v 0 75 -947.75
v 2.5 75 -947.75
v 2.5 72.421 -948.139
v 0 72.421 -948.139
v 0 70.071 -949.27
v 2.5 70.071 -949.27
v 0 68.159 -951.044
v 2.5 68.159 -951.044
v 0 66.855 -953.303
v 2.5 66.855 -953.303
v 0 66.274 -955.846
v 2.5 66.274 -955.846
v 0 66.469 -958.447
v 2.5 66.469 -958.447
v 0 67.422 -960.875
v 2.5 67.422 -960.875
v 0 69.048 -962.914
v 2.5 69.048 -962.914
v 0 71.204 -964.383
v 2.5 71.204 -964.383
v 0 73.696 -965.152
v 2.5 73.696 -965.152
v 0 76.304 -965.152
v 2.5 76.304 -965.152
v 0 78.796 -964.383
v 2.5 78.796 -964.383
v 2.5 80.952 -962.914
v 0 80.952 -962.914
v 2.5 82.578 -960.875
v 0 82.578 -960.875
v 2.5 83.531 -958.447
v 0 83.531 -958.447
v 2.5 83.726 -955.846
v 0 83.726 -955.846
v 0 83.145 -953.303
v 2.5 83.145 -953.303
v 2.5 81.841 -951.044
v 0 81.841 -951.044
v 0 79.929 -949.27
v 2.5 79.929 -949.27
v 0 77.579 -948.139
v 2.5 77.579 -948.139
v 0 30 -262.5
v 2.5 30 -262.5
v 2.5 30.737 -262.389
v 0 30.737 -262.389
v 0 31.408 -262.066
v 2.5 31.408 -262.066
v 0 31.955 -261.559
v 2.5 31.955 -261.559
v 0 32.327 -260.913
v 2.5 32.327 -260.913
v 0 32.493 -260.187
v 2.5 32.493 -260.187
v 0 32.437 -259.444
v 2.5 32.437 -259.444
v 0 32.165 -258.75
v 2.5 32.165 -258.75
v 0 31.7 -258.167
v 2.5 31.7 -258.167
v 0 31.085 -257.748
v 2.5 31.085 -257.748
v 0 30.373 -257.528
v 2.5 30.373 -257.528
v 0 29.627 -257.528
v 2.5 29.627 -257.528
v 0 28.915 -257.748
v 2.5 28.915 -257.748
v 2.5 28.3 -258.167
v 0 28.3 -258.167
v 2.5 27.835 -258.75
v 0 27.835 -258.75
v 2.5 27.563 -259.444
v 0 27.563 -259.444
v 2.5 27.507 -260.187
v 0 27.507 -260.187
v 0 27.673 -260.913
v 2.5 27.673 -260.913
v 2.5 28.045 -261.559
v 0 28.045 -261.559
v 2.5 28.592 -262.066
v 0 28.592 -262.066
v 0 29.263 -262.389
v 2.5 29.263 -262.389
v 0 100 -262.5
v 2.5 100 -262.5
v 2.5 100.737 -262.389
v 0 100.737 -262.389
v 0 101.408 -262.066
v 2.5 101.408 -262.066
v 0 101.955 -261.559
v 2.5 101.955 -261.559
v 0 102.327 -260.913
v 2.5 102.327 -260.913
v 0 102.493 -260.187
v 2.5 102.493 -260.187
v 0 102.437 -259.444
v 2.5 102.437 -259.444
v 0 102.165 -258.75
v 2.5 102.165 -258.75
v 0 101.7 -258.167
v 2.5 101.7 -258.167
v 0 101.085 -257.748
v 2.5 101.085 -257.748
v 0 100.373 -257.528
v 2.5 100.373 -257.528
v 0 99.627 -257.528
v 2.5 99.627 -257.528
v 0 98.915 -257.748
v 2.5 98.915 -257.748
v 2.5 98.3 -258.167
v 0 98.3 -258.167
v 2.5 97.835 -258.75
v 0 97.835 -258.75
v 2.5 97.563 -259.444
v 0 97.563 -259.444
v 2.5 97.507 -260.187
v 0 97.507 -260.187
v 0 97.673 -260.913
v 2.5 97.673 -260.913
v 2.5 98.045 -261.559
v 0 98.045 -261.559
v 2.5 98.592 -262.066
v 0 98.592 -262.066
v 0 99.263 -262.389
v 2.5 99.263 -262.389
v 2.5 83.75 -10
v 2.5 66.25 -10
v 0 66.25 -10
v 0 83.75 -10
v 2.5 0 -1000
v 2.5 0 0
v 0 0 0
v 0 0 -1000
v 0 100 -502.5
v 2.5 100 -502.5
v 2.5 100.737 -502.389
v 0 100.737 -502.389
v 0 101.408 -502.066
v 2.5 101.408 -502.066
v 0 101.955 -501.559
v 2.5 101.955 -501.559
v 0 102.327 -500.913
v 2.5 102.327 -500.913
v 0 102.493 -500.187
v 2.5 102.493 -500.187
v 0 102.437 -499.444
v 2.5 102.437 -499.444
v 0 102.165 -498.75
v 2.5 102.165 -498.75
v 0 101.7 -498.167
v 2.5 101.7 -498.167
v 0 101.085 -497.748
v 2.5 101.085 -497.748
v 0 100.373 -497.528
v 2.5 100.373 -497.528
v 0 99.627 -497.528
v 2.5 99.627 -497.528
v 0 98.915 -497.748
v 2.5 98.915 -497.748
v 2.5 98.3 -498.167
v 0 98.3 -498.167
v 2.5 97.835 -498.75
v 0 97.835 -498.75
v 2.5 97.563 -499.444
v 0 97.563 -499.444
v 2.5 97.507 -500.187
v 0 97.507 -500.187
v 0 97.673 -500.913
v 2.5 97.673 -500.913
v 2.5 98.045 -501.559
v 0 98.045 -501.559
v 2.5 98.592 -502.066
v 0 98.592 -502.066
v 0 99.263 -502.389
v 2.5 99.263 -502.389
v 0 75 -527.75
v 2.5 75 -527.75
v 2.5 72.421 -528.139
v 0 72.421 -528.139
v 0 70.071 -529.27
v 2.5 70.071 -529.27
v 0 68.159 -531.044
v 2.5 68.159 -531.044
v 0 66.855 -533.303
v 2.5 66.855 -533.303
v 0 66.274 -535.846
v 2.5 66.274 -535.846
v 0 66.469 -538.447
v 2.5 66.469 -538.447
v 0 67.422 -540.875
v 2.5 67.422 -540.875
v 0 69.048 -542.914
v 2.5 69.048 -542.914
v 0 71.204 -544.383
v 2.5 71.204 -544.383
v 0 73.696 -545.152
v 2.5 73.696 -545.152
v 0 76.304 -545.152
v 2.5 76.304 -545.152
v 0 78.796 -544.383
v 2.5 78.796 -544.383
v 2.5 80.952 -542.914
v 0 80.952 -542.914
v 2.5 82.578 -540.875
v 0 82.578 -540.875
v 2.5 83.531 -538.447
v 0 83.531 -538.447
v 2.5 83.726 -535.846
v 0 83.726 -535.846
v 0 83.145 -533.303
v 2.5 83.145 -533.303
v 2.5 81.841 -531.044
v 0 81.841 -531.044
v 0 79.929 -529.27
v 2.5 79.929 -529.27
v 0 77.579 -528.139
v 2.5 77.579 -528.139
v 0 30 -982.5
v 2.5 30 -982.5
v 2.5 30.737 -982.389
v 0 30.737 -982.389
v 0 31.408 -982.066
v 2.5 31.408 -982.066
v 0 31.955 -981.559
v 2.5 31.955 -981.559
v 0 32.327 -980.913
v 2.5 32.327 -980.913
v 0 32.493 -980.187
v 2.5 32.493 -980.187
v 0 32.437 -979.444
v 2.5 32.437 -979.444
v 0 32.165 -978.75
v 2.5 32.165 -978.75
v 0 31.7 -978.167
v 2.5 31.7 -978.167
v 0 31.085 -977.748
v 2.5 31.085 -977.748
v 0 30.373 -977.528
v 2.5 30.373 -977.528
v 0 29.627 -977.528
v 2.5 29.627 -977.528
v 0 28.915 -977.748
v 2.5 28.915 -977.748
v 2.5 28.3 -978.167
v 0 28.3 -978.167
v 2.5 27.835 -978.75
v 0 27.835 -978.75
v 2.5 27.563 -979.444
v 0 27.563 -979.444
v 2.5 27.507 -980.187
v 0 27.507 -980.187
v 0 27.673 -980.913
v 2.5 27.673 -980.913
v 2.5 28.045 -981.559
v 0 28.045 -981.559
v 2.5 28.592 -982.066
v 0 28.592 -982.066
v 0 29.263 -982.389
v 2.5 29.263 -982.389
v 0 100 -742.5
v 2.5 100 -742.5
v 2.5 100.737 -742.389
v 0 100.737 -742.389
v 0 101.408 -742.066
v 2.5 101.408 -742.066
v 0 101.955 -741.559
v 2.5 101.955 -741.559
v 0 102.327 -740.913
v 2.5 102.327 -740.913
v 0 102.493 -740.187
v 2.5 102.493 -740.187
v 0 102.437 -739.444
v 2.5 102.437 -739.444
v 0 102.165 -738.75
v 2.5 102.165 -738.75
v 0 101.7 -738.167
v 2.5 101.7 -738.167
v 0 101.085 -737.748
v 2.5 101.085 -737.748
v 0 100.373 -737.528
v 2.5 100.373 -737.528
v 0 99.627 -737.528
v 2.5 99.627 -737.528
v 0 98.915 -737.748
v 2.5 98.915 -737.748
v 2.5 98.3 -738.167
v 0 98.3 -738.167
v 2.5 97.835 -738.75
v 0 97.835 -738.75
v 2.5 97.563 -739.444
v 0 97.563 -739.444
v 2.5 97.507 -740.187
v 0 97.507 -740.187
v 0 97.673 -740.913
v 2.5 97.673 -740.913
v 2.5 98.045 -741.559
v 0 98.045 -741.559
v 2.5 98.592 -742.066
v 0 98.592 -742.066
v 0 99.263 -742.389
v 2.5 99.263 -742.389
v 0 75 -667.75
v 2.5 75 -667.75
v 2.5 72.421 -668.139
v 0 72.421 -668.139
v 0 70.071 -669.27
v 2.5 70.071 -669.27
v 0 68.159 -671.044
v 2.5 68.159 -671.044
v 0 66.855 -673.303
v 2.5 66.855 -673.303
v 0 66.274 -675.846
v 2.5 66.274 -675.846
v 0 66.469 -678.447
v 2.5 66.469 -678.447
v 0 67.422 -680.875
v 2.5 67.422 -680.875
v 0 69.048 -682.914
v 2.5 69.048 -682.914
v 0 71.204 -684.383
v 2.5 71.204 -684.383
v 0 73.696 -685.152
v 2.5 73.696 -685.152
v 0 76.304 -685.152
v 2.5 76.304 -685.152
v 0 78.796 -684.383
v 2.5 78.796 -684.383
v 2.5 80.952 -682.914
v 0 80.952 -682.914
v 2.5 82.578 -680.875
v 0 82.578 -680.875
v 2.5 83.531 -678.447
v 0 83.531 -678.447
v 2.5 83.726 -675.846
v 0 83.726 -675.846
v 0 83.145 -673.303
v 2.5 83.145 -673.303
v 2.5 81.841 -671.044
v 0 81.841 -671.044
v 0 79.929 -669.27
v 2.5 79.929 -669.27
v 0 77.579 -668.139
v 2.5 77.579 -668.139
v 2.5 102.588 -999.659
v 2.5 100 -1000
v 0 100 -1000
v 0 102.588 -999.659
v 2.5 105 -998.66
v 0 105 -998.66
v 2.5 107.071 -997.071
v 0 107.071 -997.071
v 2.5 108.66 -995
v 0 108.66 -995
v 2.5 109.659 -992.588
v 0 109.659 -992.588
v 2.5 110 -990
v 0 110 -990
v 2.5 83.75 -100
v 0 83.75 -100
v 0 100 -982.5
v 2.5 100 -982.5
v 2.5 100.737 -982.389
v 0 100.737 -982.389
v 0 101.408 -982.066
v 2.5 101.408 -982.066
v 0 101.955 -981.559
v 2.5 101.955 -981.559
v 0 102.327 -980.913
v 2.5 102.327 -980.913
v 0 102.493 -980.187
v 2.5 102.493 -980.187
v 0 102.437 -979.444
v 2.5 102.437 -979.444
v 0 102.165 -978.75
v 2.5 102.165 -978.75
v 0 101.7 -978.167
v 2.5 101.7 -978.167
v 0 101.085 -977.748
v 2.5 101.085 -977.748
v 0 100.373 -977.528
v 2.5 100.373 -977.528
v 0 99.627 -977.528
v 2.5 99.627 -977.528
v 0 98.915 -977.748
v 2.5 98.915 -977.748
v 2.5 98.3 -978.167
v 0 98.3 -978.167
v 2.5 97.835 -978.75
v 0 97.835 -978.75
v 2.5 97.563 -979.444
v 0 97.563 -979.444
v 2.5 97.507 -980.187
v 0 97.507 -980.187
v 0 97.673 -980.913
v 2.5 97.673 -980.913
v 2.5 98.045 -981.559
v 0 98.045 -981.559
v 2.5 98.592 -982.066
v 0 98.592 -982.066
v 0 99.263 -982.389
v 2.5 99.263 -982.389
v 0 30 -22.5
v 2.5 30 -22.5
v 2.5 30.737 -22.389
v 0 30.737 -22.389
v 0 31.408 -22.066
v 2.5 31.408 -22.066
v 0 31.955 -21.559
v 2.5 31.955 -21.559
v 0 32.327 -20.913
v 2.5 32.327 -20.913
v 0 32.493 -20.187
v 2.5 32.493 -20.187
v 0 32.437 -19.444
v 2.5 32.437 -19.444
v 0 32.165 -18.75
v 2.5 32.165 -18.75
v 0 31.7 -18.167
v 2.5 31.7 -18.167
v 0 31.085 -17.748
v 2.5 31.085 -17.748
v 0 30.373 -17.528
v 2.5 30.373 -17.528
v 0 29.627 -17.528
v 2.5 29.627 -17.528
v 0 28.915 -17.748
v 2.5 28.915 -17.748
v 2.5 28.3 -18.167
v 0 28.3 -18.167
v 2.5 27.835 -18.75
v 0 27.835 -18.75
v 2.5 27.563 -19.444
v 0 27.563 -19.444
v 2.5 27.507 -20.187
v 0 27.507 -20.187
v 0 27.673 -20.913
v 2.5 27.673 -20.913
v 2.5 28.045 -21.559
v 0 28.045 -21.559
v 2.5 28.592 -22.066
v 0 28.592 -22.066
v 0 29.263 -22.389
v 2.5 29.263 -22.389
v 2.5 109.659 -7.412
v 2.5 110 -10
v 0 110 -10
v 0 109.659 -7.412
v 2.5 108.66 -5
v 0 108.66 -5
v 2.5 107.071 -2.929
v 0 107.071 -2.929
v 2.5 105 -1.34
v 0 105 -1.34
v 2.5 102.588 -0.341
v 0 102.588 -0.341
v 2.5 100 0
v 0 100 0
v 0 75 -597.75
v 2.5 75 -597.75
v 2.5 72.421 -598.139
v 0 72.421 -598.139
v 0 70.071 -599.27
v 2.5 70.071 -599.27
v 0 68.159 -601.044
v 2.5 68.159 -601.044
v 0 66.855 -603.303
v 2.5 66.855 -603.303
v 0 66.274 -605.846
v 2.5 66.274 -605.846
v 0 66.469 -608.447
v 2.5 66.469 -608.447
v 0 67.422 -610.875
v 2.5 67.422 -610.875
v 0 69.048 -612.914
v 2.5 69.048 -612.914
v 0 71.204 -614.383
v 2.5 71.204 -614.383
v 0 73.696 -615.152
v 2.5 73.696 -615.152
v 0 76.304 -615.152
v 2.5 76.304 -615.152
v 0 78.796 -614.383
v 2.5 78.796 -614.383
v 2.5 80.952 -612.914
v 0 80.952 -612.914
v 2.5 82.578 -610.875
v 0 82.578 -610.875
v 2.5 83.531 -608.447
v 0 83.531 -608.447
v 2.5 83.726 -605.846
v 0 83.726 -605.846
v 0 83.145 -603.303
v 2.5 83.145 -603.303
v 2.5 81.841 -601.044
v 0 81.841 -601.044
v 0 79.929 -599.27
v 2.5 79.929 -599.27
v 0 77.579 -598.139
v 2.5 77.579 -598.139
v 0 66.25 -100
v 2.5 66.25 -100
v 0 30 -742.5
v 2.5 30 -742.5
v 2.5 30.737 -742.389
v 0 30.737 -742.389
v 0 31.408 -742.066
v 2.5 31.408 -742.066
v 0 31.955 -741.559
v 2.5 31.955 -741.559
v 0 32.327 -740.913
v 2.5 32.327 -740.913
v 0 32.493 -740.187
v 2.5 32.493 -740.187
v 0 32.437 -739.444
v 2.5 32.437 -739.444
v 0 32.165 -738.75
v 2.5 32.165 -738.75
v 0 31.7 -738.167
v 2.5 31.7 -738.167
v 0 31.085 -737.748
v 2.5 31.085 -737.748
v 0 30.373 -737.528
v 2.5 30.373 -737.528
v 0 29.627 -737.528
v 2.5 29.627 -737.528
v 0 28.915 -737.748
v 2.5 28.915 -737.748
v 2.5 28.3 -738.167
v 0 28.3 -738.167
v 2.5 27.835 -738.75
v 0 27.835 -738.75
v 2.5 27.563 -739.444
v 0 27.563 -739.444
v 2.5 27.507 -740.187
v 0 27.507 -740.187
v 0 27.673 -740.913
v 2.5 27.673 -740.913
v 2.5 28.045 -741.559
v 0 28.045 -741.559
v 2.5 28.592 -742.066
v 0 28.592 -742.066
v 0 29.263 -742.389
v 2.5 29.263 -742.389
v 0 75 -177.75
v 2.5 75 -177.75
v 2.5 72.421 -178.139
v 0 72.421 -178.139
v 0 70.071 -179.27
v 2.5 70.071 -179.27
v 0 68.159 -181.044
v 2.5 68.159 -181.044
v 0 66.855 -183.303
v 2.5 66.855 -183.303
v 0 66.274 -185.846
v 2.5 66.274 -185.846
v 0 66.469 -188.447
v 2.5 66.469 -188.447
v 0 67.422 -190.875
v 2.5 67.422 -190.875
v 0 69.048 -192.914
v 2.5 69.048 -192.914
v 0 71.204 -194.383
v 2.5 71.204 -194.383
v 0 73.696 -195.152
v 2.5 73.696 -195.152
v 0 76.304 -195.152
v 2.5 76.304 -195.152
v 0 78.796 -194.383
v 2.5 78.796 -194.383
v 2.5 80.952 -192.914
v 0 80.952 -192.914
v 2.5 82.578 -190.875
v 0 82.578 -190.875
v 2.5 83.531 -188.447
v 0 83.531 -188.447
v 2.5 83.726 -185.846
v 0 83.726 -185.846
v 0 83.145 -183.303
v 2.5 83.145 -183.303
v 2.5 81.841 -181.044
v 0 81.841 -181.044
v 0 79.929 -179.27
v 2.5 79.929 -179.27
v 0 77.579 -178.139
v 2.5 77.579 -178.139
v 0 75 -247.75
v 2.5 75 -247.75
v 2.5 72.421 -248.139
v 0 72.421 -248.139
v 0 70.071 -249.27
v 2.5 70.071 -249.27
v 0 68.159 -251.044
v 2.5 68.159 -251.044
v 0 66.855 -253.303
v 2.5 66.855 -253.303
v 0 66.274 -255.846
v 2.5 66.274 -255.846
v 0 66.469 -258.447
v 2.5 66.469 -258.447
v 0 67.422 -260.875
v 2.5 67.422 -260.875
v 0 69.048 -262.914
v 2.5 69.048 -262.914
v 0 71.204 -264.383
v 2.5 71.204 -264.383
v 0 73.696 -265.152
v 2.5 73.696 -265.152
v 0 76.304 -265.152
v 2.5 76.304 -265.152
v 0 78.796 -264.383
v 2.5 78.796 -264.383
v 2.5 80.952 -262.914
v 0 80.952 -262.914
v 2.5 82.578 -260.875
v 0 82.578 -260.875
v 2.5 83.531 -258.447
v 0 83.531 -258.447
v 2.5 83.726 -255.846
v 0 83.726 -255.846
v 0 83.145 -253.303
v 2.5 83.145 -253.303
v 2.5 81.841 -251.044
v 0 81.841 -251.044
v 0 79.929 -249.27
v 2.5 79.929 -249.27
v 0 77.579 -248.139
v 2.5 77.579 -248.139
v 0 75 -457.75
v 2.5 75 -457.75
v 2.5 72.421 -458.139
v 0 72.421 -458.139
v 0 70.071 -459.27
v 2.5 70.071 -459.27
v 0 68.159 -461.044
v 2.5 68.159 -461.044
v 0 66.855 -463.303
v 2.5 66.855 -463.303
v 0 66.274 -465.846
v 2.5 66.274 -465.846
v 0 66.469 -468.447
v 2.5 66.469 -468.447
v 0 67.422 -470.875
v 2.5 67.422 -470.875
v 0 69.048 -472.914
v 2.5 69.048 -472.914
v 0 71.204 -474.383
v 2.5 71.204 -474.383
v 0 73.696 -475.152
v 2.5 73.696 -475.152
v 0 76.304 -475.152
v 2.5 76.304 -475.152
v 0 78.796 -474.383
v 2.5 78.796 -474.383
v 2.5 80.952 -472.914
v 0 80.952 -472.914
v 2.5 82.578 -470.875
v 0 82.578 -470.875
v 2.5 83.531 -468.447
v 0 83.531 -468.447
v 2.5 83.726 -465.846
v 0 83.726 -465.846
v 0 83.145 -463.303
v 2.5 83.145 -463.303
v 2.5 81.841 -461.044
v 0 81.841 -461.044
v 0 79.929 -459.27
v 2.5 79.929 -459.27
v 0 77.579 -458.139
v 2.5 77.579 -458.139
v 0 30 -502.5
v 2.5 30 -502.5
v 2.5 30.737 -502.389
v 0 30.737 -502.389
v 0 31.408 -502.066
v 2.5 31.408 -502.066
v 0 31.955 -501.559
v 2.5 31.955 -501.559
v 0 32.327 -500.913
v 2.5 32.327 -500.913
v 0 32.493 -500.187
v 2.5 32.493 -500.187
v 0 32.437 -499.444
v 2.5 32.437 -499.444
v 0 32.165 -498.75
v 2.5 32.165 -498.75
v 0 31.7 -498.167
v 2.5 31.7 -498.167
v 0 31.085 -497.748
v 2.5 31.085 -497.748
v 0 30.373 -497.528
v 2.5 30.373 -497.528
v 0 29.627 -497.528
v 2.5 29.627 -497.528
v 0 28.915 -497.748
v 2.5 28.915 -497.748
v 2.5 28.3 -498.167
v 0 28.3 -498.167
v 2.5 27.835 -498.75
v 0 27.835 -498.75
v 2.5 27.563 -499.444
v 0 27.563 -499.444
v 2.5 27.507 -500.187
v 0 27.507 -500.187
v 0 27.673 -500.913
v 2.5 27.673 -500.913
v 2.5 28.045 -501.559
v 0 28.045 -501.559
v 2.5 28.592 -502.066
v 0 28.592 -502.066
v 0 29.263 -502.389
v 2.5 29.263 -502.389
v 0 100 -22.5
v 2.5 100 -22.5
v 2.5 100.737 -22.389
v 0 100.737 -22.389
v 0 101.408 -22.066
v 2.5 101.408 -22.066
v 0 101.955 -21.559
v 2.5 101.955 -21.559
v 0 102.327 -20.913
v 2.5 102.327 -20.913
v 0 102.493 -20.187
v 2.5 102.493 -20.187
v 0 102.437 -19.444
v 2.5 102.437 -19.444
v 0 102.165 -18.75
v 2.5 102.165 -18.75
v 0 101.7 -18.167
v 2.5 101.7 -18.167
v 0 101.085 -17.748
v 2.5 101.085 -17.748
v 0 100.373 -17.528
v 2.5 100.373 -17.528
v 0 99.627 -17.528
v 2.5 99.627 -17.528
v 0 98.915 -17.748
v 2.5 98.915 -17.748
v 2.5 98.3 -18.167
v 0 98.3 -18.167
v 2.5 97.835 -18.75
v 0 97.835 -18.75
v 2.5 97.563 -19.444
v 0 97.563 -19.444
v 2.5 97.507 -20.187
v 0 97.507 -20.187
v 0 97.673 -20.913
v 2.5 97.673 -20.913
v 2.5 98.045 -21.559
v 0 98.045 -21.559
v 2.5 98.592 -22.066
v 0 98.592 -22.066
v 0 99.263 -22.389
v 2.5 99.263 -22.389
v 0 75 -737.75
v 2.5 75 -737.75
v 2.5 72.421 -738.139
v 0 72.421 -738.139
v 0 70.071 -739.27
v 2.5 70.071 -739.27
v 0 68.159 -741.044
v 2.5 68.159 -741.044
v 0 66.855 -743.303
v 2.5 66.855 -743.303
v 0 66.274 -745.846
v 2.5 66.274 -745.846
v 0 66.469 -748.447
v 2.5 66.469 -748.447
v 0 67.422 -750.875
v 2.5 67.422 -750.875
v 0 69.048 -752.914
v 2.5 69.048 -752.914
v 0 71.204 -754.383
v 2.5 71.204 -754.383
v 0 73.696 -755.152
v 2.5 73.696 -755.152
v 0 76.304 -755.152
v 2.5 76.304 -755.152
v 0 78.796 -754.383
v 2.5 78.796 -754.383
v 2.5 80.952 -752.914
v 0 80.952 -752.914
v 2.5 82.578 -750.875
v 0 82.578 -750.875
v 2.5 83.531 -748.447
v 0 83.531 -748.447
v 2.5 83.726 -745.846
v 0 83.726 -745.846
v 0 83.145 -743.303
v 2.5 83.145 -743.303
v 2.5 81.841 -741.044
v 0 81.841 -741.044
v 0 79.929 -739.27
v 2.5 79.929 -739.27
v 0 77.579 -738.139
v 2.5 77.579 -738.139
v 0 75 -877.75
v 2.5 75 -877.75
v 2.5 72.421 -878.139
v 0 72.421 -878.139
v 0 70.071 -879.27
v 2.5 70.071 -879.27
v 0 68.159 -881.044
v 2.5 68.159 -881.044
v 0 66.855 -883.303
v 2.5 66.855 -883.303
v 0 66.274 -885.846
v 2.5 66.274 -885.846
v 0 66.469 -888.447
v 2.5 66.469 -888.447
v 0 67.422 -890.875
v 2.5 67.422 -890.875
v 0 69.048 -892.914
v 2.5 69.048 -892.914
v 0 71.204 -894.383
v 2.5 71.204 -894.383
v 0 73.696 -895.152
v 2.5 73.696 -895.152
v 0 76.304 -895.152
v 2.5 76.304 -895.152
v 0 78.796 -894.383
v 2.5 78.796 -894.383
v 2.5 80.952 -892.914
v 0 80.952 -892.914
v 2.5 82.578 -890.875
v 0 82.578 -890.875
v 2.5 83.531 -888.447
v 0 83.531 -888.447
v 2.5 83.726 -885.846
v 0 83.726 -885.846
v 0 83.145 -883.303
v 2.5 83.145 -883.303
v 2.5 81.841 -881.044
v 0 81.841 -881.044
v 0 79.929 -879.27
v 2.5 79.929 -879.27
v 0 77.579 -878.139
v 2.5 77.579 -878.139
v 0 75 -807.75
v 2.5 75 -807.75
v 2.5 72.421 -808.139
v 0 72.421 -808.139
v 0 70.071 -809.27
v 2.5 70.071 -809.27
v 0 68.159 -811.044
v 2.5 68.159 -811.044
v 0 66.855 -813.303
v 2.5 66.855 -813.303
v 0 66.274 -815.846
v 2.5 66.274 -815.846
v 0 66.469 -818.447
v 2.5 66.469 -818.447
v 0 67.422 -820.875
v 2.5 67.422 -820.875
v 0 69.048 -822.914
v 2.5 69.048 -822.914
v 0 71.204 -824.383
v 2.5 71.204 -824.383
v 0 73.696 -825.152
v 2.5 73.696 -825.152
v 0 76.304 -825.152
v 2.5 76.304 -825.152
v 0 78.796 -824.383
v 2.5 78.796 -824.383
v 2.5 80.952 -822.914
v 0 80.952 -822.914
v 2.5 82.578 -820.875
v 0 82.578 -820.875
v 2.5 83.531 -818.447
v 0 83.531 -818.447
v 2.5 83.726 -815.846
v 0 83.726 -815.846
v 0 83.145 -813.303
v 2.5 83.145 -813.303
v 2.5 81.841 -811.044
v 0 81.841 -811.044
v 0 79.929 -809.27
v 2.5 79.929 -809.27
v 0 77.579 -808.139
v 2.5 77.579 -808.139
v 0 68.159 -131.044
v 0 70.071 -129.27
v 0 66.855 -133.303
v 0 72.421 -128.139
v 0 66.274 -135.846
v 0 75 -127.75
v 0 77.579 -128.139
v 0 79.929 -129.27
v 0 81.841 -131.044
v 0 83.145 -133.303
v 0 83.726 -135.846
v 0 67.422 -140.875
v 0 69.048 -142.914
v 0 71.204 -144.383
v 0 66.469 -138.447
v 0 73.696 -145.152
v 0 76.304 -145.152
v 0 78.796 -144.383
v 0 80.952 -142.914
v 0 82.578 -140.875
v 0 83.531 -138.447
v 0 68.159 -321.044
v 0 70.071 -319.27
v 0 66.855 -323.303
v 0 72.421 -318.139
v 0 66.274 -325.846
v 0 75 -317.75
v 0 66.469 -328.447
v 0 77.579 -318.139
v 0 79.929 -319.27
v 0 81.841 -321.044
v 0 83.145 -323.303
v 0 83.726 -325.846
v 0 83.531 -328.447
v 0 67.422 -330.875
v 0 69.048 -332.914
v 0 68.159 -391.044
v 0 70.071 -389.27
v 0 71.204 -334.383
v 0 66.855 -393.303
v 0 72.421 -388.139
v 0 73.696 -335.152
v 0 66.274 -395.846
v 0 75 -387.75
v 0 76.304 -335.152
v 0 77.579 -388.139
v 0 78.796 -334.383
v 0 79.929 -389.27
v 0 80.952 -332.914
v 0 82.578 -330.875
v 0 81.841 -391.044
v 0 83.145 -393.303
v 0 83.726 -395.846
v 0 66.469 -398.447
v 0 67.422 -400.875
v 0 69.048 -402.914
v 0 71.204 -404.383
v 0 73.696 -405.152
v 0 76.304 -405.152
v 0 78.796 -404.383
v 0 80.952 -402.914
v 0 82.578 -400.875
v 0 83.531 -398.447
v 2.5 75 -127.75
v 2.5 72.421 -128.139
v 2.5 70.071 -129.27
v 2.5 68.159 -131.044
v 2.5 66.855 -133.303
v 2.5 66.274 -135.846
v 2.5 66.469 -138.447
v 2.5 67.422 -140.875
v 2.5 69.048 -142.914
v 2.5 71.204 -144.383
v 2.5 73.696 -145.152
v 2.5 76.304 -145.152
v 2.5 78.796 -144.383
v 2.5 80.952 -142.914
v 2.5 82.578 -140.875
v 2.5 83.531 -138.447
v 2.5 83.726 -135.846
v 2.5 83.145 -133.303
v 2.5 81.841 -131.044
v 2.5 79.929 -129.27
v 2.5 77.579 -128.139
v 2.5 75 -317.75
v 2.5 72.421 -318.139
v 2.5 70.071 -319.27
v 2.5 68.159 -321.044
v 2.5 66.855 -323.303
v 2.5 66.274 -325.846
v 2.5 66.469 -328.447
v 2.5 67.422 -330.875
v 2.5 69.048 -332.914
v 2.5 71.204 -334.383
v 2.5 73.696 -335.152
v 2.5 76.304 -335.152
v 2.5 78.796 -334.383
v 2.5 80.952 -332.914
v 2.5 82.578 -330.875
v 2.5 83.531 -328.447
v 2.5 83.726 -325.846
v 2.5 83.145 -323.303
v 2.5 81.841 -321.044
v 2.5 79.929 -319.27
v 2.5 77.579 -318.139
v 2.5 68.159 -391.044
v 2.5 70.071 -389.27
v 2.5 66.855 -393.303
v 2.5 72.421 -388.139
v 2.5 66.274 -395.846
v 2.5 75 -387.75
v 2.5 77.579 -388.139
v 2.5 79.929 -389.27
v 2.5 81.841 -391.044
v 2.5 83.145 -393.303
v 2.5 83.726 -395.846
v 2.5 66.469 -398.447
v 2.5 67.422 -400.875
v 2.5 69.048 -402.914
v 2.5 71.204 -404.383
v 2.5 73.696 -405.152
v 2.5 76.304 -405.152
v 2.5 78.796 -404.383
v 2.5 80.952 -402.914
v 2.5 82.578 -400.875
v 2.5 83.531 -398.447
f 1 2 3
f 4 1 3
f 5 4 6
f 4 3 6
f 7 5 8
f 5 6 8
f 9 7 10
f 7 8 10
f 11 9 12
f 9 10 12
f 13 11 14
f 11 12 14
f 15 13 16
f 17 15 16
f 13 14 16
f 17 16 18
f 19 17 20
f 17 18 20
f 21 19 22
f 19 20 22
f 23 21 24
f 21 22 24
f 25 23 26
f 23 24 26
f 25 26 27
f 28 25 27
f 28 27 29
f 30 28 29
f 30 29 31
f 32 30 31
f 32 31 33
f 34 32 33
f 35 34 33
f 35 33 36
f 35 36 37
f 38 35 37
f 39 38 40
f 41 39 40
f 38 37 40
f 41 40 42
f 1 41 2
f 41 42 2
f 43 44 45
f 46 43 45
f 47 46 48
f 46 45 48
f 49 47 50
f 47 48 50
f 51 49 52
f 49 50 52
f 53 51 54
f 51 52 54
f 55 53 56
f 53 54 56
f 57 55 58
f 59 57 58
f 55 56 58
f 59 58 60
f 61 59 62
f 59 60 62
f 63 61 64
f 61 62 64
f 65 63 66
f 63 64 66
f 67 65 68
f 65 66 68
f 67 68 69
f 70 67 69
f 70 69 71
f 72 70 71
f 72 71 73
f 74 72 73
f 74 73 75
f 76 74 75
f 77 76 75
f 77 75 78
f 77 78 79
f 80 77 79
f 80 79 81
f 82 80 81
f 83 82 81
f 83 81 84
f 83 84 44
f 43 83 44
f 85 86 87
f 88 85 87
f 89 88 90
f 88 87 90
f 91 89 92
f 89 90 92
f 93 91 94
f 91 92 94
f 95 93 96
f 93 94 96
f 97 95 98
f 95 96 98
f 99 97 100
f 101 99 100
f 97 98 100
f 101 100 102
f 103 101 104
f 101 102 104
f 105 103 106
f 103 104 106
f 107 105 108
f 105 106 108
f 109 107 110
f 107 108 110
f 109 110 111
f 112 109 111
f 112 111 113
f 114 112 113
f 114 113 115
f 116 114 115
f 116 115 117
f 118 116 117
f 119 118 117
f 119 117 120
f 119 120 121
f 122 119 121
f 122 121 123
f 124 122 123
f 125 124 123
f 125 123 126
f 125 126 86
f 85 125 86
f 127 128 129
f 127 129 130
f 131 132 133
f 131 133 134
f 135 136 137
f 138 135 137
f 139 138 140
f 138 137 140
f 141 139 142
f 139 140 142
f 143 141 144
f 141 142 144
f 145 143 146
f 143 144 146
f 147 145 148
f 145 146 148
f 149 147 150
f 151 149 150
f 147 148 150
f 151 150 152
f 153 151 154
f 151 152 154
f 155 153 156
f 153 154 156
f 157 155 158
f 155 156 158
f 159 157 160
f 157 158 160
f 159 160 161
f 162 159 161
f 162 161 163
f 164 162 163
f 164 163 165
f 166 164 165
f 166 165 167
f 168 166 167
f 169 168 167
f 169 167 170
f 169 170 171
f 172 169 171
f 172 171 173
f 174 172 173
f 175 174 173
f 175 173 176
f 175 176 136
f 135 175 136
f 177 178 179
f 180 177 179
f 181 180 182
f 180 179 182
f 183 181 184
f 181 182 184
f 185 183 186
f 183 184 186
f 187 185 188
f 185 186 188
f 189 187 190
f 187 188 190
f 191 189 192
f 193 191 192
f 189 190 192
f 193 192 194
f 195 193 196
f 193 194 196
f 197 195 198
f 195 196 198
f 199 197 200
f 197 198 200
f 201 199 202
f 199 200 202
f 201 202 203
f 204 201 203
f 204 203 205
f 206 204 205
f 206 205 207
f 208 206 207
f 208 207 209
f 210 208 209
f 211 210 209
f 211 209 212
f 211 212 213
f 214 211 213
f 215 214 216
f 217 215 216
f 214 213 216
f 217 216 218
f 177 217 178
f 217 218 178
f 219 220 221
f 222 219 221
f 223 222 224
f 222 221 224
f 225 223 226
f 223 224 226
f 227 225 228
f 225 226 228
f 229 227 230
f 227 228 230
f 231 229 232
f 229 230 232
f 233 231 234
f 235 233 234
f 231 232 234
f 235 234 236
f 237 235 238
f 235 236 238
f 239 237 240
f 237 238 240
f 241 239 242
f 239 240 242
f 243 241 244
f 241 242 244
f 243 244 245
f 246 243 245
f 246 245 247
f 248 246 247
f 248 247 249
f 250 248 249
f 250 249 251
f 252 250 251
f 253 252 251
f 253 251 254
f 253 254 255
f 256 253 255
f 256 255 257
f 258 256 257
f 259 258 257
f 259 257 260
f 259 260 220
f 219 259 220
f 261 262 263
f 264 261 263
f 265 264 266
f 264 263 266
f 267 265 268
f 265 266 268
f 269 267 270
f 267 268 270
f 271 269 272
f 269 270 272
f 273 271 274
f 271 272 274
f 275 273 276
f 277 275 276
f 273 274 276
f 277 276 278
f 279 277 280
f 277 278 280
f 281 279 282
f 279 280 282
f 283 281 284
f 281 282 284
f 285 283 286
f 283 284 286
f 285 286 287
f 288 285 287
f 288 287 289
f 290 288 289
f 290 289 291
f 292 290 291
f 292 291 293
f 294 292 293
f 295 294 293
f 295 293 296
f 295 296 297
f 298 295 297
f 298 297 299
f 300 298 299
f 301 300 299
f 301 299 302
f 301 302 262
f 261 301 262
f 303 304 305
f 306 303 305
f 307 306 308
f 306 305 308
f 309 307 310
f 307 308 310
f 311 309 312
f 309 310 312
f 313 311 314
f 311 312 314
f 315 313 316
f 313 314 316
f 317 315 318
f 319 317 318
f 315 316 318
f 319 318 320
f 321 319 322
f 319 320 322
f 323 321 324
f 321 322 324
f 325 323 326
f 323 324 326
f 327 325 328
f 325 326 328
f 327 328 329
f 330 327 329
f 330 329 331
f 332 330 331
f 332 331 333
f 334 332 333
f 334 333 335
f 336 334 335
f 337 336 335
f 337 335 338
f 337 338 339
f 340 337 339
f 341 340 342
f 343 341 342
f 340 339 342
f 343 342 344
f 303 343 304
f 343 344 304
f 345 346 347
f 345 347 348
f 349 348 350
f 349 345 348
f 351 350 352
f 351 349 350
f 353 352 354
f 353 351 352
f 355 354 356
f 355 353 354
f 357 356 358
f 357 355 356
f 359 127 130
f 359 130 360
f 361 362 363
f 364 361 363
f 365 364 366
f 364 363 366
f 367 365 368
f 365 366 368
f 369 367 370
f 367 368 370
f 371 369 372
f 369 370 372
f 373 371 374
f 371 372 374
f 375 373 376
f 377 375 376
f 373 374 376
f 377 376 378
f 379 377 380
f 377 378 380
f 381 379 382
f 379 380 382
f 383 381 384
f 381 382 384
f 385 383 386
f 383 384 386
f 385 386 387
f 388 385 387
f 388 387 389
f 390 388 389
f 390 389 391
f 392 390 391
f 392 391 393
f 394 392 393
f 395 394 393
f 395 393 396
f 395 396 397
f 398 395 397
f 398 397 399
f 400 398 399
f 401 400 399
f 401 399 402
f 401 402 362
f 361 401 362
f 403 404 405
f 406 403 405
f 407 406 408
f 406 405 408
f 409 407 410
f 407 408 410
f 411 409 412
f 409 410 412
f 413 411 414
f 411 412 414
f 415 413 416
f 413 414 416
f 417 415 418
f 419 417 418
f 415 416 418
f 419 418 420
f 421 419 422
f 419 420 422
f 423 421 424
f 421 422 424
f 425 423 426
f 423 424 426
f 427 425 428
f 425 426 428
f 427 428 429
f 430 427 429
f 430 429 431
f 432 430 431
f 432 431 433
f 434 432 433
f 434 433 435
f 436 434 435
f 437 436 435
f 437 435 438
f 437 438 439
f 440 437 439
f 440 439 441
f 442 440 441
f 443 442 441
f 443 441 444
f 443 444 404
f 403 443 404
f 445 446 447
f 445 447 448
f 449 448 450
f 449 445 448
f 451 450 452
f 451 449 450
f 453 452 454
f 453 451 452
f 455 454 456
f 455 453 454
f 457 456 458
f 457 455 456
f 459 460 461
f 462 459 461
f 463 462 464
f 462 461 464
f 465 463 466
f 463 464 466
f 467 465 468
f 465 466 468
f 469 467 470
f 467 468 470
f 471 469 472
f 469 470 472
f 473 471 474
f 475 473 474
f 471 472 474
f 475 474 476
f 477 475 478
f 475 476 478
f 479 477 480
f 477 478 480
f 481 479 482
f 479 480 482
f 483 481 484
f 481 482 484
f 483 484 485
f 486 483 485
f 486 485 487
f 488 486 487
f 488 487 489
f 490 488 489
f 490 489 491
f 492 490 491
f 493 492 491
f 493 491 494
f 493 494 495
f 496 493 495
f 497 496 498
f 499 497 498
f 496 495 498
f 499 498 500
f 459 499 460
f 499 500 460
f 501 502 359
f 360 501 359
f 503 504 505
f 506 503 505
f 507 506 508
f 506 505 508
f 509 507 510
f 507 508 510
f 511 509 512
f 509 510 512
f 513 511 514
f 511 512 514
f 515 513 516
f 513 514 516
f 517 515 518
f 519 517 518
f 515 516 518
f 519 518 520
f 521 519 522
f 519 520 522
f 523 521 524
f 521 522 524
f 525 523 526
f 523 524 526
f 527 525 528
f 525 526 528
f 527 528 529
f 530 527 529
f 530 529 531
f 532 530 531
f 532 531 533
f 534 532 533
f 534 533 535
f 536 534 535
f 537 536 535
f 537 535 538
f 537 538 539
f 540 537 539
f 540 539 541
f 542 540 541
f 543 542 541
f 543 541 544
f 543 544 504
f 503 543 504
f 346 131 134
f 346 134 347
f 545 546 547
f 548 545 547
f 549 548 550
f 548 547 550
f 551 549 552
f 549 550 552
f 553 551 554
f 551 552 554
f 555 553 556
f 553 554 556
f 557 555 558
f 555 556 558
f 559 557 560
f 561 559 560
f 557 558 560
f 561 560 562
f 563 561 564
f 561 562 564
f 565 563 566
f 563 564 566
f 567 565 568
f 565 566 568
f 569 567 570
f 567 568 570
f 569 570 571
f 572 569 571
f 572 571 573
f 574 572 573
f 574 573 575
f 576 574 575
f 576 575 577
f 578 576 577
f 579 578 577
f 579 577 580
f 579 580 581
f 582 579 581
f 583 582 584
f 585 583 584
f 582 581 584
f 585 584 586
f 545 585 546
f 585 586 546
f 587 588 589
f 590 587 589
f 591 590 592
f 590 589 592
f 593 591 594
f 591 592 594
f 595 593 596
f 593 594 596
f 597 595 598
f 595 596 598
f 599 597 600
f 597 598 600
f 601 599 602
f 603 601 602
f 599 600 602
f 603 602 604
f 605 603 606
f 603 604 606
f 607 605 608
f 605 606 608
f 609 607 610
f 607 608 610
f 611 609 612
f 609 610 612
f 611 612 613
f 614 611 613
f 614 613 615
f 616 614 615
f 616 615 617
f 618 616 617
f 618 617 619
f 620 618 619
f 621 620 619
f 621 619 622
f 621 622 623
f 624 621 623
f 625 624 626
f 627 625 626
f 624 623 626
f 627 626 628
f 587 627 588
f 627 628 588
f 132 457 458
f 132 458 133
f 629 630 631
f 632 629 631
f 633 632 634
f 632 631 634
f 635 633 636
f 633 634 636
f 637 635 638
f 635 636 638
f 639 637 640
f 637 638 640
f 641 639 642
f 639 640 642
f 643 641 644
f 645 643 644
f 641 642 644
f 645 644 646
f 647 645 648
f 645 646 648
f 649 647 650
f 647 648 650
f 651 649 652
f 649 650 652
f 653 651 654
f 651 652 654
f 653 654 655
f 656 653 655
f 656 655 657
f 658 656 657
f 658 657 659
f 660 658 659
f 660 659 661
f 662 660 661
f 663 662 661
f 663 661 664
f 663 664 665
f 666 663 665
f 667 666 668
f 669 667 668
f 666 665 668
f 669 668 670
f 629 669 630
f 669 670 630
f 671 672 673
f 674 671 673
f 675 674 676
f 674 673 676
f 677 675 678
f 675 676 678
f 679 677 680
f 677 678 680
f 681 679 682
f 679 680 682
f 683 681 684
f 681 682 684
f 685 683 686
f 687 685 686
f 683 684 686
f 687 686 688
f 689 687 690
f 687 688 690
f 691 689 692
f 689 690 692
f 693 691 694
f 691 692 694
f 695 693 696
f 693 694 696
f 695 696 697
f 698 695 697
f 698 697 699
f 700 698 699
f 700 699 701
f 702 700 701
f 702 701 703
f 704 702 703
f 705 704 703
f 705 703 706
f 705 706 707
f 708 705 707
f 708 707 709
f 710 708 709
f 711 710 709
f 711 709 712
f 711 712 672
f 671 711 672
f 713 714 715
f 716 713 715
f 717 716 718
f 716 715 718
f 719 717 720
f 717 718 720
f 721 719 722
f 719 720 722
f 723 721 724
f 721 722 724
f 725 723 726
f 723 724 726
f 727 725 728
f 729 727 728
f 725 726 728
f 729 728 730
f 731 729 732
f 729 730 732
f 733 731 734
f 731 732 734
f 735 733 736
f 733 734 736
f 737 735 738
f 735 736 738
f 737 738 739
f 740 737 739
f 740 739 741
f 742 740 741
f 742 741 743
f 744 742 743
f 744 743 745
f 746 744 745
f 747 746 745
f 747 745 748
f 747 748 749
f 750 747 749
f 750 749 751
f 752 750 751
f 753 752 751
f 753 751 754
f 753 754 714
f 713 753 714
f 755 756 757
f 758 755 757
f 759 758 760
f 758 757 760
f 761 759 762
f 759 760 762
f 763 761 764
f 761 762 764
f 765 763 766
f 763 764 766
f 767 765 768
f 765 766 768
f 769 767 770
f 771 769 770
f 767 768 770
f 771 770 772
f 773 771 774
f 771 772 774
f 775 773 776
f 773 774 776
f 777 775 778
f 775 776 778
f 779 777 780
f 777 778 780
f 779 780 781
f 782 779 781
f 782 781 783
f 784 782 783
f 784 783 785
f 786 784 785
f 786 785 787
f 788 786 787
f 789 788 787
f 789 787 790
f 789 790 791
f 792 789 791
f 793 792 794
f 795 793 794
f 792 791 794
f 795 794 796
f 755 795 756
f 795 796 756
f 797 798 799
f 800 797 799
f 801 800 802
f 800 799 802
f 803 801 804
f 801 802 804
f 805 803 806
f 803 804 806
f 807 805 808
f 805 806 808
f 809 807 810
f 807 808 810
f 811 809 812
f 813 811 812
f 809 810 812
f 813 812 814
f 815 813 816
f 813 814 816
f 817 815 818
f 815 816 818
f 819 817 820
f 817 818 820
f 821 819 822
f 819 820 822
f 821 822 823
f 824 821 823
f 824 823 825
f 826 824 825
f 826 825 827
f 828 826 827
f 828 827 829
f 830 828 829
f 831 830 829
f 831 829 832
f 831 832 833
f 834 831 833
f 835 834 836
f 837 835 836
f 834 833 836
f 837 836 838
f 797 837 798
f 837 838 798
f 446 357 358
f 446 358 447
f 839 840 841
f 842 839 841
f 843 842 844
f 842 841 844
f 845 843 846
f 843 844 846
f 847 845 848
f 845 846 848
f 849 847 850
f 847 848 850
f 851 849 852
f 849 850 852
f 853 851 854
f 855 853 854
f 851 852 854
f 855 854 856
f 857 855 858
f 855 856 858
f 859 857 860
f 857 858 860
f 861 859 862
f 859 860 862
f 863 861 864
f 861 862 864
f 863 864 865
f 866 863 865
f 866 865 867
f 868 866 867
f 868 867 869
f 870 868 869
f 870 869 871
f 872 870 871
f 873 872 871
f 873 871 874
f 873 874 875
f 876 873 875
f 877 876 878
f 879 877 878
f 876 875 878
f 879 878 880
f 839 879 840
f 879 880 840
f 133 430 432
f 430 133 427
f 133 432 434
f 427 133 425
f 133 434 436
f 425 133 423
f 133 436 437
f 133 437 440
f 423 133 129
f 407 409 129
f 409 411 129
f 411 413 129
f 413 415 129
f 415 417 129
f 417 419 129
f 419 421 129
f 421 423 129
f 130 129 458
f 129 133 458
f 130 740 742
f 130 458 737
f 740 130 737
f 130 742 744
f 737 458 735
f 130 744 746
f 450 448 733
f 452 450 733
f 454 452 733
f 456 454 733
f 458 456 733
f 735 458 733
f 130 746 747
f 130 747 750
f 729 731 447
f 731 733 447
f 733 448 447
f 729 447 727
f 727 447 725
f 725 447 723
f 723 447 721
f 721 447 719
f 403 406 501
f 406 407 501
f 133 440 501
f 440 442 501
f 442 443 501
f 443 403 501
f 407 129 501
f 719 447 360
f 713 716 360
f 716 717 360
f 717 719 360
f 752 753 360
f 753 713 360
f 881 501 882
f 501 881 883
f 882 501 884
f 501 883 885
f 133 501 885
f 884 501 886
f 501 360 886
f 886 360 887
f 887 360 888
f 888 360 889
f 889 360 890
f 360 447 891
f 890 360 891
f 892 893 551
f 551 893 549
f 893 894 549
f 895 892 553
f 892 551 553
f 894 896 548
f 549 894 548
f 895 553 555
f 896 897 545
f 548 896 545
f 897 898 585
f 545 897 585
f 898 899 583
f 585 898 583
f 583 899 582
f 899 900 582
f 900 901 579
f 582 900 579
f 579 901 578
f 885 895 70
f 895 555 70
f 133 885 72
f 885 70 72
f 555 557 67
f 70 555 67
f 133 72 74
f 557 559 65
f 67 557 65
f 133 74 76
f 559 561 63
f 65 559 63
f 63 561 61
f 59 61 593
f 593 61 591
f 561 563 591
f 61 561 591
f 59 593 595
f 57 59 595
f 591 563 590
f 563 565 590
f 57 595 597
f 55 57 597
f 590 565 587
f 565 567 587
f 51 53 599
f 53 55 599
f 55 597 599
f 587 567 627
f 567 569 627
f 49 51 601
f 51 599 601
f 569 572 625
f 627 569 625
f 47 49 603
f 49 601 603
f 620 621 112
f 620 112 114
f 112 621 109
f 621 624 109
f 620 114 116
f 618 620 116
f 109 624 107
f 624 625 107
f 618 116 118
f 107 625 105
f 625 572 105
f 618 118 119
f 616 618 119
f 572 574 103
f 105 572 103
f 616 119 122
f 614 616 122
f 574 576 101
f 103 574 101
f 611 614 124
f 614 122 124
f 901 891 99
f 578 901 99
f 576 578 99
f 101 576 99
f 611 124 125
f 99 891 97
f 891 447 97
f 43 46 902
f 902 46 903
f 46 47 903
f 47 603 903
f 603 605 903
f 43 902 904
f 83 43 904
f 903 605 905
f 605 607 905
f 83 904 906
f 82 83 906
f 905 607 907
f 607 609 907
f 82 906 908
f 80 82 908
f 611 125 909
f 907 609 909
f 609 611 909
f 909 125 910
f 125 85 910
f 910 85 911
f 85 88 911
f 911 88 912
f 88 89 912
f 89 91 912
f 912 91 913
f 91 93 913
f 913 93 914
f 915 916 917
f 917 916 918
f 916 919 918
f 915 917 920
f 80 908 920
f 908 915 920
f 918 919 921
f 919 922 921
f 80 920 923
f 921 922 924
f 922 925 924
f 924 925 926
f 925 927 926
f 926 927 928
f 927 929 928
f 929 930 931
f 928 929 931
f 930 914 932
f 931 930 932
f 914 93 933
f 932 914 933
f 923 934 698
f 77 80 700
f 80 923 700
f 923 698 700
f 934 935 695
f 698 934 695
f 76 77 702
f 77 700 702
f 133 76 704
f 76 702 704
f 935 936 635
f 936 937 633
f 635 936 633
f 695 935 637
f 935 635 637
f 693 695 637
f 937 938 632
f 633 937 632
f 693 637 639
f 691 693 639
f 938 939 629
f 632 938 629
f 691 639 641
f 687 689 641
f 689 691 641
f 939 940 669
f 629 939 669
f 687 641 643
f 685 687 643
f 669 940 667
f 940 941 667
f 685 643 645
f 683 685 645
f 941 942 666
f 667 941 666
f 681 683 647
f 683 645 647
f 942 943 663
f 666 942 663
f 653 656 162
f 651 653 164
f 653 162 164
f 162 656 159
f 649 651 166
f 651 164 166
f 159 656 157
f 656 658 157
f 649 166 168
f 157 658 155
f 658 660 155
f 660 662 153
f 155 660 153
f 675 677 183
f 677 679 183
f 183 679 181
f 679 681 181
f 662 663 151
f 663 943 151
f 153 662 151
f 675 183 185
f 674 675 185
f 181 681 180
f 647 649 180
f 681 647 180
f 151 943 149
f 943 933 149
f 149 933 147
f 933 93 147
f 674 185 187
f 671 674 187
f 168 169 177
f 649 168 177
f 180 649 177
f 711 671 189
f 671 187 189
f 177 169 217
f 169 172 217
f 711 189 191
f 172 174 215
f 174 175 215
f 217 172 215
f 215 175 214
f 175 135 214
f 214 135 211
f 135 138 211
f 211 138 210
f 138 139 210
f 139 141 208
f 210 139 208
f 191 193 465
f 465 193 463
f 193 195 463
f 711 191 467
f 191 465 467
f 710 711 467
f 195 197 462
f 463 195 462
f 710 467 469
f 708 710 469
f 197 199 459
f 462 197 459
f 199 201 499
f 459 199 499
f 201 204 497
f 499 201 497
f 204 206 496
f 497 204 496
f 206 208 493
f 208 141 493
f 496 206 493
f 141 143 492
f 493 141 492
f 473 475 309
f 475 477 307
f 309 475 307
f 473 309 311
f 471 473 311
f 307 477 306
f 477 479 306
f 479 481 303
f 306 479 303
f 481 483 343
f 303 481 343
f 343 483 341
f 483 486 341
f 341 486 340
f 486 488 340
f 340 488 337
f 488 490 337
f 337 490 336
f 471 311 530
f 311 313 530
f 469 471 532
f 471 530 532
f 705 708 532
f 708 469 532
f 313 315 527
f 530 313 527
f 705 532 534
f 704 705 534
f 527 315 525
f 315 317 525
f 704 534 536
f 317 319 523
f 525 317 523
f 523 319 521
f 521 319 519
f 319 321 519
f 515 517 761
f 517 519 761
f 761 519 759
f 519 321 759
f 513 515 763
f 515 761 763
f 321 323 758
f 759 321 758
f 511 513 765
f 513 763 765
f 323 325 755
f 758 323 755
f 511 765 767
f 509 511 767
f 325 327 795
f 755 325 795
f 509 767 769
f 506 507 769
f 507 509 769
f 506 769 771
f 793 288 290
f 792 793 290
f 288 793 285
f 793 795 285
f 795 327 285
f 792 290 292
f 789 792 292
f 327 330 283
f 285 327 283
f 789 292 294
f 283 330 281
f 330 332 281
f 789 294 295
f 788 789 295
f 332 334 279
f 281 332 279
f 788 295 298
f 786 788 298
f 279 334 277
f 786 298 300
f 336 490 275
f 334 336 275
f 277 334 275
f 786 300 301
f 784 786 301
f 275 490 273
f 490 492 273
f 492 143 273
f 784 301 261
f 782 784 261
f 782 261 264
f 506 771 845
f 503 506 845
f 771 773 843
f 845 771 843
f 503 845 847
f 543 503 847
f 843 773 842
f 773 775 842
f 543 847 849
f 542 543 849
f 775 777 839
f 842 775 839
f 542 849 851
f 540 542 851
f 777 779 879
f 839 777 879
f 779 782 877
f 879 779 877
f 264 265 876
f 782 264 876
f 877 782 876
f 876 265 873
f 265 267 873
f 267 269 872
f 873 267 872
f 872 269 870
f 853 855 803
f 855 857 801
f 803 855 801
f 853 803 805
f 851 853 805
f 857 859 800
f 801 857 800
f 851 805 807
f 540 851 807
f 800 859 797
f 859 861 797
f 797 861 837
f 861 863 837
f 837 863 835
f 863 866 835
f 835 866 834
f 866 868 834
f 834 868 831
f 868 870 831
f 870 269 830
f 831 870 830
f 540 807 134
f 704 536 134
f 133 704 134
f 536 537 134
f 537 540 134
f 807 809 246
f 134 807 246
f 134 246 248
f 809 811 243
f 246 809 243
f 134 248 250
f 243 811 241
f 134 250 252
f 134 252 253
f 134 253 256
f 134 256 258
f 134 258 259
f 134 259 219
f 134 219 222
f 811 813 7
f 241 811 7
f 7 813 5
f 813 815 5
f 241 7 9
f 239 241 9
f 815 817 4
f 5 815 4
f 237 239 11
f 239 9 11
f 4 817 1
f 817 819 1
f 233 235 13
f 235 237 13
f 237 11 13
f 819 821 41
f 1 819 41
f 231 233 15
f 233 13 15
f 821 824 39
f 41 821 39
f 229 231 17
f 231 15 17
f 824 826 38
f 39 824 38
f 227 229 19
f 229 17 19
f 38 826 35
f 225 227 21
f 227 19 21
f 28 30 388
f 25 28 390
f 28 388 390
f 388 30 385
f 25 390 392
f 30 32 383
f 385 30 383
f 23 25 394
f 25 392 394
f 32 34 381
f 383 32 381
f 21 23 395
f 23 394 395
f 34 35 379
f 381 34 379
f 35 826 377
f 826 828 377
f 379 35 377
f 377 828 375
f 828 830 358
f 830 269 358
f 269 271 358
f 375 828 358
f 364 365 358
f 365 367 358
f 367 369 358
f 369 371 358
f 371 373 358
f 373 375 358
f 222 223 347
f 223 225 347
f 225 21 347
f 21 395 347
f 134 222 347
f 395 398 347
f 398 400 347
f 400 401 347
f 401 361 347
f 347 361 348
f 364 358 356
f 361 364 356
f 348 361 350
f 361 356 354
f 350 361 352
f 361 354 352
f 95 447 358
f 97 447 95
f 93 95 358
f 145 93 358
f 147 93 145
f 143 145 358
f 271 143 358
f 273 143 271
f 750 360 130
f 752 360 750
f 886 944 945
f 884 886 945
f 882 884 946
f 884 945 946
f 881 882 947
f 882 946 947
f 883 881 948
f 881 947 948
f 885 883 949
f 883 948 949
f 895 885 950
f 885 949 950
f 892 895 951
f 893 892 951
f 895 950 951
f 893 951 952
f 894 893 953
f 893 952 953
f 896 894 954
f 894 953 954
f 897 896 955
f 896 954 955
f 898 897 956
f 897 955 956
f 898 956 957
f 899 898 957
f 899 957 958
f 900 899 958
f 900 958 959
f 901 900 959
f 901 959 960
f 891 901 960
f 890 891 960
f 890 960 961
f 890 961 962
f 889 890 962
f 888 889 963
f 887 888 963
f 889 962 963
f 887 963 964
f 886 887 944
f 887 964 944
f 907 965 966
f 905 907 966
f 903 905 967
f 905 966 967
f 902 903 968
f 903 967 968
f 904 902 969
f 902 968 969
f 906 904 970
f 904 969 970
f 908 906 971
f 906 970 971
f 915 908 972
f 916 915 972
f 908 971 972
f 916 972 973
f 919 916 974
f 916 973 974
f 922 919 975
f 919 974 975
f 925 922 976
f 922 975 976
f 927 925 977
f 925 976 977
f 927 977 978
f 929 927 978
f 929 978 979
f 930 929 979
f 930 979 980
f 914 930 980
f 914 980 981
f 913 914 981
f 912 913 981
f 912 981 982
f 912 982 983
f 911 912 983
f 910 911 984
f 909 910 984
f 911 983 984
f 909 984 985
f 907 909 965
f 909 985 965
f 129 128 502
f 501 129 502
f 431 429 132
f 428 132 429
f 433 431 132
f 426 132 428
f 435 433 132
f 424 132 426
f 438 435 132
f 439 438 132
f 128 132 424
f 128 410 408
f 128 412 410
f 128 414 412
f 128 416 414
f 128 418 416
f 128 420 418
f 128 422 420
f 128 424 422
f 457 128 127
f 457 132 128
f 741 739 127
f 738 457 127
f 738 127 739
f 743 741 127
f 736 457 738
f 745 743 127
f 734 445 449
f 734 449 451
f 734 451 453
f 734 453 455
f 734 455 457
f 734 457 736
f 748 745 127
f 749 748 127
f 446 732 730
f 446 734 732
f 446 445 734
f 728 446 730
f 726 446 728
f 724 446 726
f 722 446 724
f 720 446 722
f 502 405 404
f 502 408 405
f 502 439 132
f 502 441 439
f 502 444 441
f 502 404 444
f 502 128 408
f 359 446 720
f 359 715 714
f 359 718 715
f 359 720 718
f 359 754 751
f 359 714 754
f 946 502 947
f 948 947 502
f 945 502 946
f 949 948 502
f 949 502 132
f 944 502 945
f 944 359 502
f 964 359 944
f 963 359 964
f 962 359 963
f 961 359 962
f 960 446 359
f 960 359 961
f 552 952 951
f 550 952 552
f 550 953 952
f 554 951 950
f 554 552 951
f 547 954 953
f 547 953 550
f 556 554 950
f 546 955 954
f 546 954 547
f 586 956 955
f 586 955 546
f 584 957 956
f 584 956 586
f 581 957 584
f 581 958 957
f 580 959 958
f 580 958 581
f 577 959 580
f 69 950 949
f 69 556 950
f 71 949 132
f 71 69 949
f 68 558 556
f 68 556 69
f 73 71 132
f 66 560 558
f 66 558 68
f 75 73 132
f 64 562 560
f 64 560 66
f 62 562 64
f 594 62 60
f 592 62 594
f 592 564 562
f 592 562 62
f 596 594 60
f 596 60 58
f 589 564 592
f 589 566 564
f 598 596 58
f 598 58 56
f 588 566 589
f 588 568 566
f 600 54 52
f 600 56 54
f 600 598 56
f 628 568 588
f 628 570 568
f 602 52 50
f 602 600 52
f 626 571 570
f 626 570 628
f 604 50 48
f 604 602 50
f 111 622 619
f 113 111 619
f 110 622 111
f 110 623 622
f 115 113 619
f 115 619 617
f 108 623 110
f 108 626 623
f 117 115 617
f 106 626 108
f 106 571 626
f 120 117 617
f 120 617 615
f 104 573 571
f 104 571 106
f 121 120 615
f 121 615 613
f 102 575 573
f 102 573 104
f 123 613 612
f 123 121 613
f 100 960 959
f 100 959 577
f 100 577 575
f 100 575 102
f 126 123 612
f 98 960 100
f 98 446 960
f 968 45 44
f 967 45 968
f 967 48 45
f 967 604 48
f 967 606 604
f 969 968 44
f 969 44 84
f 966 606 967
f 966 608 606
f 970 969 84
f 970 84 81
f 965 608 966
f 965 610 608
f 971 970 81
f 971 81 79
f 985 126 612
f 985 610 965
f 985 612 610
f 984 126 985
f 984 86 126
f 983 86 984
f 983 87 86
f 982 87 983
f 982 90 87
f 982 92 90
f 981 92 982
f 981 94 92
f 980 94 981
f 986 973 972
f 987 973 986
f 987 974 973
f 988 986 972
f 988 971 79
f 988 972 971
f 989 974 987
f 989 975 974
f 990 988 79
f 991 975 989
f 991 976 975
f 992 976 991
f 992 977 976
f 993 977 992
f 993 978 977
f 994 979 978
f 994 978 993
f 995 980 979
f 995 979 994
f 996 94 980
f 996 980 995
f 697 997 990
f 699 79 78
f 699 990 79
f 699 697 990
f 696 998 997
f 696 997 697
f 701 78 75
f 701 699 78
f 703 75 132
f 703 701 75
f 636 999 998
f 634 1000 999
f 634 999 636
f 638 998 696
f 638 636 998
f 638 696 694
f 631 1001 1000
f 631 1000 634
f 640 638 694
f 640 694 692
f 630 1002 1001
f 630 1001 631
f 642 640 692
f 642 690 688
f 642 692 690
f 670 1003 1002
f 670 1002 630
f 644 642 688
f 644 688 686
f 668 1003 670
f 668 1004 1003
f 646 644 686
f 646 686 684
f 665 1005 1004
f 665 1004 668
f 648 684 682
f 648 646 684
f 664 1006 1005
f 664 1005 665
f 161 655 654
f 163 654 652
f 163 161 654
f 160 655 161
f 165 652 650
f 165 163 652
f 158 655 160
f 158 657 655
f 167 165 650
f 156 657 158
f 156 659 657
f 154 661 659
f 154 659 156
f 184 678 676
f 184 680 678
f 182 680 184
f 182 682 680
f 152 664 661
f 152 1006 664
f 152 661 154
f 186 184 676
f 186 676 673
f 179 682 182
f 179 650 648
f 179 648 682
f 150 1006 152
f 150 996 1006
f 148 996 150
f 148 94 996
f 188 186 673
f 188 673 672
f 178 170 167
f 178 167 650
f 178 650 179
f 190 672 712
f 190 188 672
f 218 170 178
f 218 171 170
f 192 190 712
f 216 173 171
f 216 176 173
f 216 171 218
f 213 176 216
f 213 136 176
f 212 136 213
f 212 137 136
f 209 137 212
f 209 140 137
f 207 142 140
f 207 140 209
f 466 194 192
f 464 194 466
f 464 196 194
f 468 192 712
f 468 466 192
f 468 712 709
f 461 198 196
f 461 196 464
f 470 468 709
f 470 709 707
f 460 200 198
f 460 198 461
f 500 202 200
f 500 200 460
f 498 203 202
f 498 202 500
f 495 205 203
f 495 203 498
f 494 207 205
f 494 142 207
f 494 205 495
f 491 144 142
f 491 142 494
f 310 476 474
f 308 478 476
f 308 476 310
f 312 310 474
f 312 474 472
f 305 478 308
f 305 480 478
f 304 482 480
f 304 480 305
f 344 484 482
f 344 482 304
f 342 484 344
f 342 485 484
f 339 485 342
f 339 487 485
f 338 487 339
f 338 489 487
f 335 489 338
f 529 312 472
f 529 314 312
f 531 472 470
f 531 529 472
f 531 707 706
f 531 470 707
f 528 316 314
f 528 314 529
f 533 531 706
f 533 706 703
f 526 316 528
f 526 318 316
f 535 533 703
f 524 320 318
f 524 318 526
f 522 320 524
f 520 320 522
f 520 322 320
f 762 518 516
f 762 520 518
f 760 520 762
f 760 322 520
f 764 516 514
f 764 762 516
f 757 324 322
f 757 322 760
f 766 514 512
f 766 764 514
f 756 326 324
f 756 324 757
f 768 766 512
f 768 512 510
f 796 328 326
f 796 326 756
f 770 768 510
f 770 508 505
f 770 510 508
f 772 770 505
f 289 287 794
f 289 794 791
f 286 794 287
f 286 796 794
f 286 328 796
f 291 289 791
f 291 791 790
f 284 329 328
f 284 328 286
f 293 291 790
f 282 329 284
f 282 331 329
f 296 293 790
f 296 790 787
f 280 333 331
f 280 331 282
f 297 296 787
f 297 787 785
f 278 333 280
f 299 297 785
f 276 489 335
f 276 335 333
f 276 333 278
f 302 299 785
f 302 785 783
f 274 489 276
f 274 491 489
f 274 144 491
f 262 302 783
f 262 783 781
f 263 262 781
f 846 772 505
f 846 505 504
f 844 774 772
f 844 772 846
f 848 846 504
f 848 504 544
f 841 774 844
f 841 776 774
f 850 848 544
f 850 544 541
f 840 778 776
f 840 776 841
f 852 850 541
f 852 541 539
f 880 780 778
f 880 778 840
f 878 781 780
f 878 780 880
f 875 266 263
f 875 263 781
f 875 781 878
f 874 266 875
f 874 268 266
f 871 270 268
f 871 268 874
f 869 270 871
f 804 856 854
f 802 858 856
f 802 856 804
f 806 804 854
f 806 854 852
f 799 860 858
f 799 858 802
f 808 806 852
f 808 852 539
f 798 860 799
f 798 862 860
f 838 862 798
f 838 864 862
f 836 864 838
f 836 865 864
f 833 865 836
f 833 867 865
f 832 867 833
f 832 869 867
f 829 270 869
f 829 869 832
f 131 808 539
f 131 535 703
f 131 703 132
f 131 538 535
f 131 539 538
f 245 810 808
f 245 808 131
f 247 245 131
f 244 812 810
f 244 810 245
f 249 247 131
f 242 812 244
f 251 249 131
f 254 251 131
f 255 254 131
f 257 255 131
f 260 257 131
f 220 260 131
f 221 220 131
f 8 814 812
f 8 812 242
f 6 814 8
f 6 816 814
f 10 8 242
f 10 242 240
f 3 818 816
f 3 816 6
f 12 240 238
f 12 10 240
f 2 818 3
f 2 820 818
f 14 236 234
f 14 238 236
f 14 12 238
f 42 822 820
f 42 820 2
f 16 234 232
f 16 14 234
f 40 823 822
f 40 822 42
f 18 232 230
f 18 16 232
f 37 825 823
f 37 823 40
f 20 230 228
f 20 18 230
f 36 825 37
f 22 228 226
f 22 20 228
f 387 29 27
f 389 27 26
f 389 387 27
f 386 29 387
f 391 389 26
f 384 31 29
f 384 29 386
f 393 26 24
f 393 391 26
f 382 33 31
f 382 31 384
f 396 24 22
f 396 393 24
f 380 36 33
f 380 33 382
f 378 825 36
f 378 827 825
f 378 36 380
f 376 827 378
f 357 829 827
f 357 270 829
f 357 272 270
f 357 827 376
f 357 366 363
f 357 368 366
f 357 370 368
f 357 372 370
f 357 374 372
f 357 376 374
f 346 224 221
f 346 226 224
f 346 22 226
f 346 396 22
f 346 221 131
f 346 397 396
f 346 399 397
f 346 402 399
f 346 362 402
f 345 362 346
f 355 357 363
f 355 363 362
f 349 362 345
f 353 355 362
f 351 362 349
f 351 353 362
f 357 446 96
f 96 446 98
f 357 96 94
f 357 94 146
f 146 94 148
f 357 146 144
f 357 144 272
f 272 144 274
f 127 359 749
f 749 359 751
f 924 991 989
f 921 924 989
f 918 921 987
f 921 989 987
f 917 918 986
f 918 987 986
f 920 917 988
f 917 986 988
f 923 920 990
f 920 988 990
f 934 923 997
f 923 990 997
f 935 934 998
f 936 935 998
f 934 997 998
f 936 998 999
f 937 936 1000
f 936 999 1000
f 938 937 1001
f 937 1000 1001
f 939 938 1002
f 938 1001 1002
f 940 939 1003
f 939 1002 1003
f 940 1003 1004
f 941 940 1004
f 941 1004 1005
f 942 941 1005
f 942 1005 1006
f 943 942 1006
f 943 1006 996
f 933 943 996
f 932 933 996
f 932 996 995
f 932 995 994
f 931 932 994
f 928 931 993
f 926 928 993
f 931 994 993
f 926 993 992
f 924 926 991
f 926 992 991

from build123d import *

# Parameters (mm, degrees)
SKETCH1_R           = 8.75
SKETCH1_W           = 90
SKETCH1_H           = 17.5
BOSS_EXTRUDE1_DEPTH = 2.5
SKETCH2_R           = 2.5
CUT_EXTRUDE1_DEPTH  = 1007.034914901


with BuildPart() as part:
    # Sketch1 → Boss-Extrude1 (new body)
    with BuildSketch(Plane(origin=(2.5, 0, 0), x_dir=(0, 0, -1), z_dir=(1, 0, 0))):
        with BuildLine():
            Line((1000, 0), (1000, 100))
            ThreePointArc((1000, 100), (997.071067812, 107.071067812), (990, 110))
            Line((990, 110), (10, 110))
            ThreePointArc((10, 110), (2.928932188, 107.071067812), (0, 100))
            Line((0, 100), (0, 0))
            Line((0, 0), (1000, 0))
        make_face()
        with Locations(Location((136.5, 75, 0), (0, 0, 180))):
            Circle(SKETCH1_R, mode=Mode.SUBTRACT)
        with Locations(Location((186.5, 75, 0), (0, 0, 180))):
            Circle(SKETCH1_R, mode=Mode.SUBTRACT)
        with Locations(Location((256.5, 75, 0), (0, 0, 180))):
            Circle(SKETCH1_R, mode=Mode.SUBTRACT)
        with Locations(Location((326.5, 75, 0), (0, 0, 180))):
            Circle(SKETCH1_R, mode=Mode.SUBTRACT)
        with Locations(Location((396.5, 75, 0), (0, 0, 180))):
            Circle(SKETCH1_R, mode=Mode.SUBTRACT)
        with Locations(Location((466.5, 75, 0), (0, 0, 180))):
            Circle(SKETCH1_R, mode=Mode.SUBTRACT)
        with Locations(Location((536.5, 75, 0), (0, 0, 180))):
            Circle(SKETCH1_R, mode=Mode.SUBTRACT)
        with Locations(Location((606.5, 75, 0), (0, 0, 180))):
            Circle(SKETCH1_R, mode=Mode.SUBTRACT)
        with Locations(Location((676.5, 75, 0), (0, 0, 180))):
            Circle(SKETCH1_R, mode=Mode.SUBTRACT)
        with Locations(Location((746.5, 75, 0), (0, 0, 180))):
            Circle(SKETCH1_R, mode=Mode.SUBTRACT)
        with Locations(Location((816.5, 75, 0), (0, 0, 180))):
            Circle(SKETCH1_R, mode=Mode.SUBTRACT)
        with Locations(Location((886.5, 75, 0), (0, 0, 180))):
            Circle(SKETCH1_R, mode=Mode.SUBTRACT)
        with Locations(Location((956.5, 75, 0), (0, 0, 180))):
            Circle(SKETCH1_R, mode=Mode.SUBTRACT)
        with Locations((55, 75)):
            Rectangle(SKETCH1_W, SKETCH1_H, mode=Mode.SUBTRACT)
    extrude(amount=-BOSS_EXTRUDE1_DEPTH)

    # Sketch2 → Cut-Extrude1 (cut, through all)
    with BuildSketch(Plane(origin=(2.5, 0, 0), x_dir=(0, 0, -1), z_dir=(1, 0, 0))):
        with Locations((500, 100)):
            Circle(SKETCH2_R)
        with Locations((20, 100)):
            Circle(SKETCH2_R)
        with Locations((980, 100)):
            Circle(SKETCH2_R)
        with Locations((980, 30)):
            Circle(SKETCH2_R)
        with Locations((500, 30)):
            Circle(SKETCH2_R)
        with Locations((20, 30)):
            Circle(SKETCH2_R)
        with Locations((260, 100)):
            Circle(SKETCH2_R)
        with Locations((260, 30)):
            Circle(SKETCH2_R)
        with Locations((740, 100)):
            Circle(SKETCH2_R)
        with Locations((740, 30)):
            Circle(SKETCH2_R)
    extrude(amount=-CUT_EXTRUDE1_DEPTH, mode=Mode.SUBTRACT)


solid = part.part
